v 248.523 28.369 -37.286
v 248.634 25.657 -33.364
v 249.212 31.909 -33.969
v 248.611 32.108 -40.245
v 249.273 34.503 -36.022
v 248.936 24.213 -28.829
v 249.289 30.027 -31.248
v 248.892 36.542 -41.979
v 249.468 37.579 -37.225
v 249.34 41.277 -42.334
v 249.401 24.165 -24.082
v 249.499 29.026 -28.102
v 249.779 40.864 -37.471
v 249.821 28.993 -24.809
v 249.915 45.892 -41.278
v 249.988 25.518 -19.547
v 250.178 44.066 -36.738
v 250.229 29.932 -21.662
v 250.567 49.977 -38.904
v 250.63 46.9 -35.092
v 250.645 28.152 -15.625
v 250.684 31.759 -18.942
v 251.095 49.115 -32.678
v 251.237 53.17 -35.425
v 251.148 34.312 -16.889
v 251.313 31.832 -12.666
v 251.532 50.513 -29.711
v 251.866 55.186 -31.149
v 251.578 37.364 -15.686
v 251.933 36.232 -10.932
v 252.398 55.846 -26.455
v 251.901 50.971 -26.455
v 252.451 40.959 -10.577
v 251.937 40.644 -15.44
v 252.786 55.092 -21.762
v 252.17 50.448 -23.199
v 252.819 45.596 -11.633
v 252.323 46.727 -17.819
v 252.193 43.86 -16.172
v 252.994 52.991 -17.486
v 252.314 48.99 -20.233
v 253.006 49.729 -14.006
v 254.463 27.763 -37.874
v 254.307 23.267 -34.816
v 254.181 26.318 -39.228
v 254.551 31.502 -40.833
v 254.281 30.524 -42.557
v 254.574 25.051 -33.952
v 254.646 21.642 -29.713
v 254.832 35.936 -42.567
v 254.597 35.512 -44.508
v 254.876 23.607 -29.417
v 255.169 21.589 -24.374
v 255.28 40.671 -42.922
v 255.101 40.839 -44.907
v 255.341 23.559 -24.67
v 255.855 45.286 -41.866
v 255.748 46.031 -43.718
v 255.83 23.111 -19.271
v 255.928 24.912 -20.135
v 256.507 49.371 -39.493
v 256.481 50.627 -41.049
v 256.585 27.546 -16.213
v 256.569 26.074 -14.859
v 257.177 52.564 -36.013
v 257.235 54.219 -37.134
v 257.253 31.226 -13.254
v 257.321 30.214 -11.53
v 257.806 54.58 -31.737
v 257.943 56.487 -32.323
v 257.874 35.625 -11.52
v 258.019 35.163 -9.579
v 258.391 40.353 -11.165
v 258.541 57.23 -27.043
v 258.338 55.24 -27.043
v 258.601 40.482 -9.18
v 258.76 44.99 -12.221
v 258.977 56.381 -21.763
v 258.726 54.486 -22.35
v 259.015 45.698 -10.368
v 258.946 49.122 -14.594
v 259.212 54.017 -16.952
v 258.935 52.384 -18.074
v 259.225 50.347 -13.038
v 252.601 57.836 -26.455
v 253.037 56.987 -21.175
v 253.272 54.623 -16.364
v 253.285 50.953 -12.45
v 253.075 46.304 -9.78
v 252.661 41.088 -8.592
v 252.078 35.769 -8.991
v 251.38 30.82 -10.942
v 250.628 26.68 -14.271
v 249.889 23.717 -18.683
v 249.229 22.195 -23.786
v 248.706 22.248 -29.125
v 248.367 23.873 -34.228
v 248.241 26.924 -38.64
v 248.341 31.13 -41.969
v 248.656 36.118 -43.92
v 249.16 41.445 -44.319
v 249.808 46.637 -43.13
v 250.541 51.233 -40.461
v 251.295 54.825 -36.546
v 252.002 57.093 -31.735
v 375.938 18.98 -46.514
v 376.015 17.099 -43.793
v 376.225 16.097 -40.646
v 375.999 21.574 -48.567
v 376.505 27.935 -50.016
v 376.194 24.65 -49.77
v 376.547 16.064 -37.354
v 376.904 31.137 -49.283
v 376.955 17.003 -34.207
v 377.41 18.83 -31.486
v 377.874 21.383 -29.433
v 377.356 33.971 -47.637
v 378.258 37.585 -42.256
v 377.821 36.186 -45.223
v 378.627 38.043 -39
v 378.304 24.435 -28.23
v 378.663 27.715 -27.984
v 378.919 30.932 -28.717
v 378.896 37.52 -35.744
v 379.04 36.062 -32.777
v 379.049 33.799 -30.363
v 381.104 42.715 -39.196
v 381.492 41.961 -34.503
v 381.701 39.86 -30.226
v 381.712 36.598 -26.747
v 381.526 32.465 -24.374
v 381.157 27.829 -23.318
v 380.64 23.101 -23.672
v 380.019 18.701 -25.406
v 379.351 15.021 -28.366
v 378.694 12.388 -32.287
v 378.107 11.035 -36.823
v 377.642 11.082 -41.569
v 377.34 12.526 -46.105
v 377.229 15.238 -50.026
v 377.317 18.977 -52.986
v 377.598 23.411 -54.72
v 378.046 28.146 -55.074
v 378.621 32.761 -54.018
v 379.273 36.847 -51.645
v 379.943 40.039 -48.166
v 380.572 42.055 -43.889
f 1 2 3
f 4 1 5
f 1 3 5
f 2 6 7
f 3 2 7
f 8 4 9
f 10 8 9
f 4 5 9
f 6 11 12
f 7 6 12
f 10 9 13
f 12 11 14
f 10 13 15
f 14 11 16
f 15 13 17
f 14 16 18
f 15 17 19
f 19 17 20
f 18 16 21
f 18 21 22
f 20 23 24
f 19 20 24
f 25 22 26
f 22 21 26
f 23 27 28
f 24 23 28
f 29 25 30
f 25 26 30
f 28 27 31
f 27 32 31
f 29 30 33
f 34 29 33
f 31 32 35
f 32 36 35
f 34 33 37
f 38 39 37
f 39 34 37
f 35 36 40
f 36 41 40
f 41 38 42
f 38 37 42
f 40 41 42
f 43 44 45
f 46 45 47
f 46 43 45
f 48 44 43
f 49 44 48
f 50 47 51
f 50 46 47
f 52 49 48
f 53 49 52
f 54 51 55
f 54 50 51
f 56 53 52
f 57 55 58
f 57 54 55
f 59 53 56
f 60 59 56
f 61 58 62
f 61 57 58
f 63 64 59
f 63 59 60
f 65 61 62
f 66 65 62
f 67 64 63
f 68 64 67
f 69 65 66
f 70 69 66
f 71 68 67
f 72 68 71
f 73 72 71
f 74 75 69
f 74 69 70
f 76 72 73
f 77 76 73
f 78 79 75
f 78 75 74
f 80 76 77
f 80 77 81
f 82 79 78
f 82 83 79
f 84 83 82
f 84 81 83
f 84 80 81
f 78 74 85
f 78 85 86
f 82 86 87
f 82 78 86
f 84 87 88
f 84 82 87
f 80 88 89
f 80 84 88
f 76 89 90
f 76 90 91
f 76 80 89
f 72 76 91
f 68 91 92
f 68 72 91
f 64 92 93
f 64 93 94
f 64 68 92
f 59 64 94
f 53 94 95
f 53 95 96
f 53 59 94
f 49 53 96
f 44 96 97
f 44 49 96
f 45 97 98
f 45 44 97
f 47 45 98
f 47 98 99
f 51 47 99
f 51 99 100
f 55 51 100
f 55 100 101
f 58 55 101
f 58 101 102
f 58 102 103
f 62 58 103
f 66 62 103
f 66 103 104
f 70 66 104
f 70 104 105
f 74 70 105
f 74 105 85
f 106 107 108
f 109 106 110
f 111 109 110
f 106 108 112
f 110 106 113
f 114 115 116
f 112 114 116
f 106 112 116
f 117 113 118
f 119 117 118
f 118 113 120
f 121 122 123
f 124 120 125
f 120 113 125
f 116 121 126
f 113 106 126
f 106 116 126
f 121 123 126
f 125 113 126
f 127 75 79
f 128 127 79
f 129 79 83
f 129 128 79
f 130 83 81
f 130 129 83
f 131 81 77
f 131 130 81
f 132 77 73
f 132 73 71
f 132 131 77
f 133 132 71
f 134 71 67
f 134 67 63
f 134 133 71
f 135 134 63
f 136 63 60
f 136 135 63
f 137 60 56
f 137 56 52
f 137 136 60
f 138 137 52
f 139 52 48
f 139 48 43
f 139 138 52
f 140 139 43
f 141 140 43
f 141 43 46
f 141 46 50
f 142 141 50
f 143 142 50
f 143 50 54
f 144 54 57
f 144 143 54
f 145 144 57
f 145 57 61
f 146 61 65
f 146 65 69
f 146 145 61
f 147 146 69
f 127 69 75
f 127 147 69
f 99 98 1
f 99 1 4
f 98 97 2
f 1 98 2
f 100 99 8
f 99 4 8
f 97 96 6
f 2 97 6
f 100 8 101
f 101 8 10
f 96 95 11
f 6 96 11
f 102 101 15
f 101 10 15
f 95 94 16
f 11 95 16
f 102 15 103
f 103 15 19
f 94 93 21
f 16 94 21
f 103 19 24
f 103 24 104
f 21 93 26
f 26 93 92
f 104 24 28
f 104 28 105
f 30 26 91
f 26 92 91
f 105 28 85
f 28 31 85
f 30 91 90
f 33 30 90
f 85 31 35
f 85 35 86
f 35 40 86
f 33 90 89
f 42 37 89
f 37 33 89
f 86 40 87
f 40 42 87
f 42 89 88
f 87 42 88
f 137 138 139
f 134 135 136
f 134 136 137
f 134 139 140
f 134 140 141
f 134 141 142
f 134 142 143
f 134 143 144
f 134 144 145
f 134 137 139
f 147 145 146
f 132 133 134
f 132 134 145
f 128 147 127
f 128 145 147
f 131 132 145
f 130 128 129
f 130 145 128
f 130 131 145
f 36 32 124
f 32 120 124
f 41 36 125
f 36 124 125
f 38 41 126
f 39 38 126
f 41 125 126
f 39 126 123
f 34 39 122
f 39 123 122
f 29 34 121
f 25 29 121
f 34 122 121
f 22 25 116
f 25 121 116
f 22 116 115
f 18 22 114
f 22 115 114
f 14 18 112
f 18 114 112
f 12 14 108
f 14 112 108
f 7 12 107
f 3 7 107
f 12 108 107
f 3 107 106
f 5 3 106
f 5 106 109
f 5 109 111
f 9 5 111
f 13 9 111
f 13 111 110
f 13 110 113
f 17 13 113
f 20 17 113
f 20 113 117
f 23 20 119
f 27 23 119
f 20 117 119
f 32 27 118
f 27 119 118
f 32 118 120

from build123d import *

# Parameters (mm, degrees)
PUNO_PROFILE_R         = 16
COLLARIN_PROFILE_R     = 18
AGUJERO_PUNO_PROFILE_R = 11.1


with BuildPart() as part:
    # Puno: sweep along a curve in space
    with BuildLine() as puno_path:
        Line((250.773980371, 39.928614124, -26.455404118), (379.480094057, 26.797990404, -39.196009311))
    # Puno profile (on start of the path) → Puno (sweep)
    with BuildSketch(Plane(origin=(250.773980371, 39.928614124, -26.455404118), x_dir=(0.10149339146789087, 0.9948362133981381, 0), z_dir=(0.9900470283507966, -0.10100479784184896, -0.09800465533169501))):
        Circle(PUNO_PROFILE_R)
    sweep(path=puno_path.line)

    # Collarin: sweep along a curve in space
    with BuildLine() as collarin_path:
        Line((250.773980371, 39.928614124, -26.455404118), (256.714262541, 39.322585337, -27.04343205))
    # Collarin profile (on start of the path) → Collarin (sweep)
    with BuildSketch(Plane(origin=(250.773980371, 39.928614124, -26.455404118), x_dir=(0.10149339146789053, 0.994836213398138, 0), z_dir=(0.9900470283507966, -0.10100479784184864, -0.09800465533169435))):
        Circle(COLLARIN_PROFILE_R)
    sweep(path=collarin_path.line)

    # Agujero_puno: sweep along a curve in space
    with BuildLine() as agujero_puno_path:
        Line((249.783933343, 40.029618922, -26.357399462), (377.5, 27, -39))
    # Agujero_puno profile (on start of the path) → Agujero_puno (sweep, cut)
    with BuildSketch(Plane(origin=(249.783933343, 40.029618922, -26.357399462), x_dir=(0.10149339146789084, 0.994836213398138, 0), z_dir=(0.9900470283507965, -0.10100479784184893, -0.09800465533169501))):
        Circle(AGUJERO_PUNO_PROFILE_R)
    sweep(path=agujero_puno_path.line, mode=Mode.SUBTRACT)


solid = part.part
